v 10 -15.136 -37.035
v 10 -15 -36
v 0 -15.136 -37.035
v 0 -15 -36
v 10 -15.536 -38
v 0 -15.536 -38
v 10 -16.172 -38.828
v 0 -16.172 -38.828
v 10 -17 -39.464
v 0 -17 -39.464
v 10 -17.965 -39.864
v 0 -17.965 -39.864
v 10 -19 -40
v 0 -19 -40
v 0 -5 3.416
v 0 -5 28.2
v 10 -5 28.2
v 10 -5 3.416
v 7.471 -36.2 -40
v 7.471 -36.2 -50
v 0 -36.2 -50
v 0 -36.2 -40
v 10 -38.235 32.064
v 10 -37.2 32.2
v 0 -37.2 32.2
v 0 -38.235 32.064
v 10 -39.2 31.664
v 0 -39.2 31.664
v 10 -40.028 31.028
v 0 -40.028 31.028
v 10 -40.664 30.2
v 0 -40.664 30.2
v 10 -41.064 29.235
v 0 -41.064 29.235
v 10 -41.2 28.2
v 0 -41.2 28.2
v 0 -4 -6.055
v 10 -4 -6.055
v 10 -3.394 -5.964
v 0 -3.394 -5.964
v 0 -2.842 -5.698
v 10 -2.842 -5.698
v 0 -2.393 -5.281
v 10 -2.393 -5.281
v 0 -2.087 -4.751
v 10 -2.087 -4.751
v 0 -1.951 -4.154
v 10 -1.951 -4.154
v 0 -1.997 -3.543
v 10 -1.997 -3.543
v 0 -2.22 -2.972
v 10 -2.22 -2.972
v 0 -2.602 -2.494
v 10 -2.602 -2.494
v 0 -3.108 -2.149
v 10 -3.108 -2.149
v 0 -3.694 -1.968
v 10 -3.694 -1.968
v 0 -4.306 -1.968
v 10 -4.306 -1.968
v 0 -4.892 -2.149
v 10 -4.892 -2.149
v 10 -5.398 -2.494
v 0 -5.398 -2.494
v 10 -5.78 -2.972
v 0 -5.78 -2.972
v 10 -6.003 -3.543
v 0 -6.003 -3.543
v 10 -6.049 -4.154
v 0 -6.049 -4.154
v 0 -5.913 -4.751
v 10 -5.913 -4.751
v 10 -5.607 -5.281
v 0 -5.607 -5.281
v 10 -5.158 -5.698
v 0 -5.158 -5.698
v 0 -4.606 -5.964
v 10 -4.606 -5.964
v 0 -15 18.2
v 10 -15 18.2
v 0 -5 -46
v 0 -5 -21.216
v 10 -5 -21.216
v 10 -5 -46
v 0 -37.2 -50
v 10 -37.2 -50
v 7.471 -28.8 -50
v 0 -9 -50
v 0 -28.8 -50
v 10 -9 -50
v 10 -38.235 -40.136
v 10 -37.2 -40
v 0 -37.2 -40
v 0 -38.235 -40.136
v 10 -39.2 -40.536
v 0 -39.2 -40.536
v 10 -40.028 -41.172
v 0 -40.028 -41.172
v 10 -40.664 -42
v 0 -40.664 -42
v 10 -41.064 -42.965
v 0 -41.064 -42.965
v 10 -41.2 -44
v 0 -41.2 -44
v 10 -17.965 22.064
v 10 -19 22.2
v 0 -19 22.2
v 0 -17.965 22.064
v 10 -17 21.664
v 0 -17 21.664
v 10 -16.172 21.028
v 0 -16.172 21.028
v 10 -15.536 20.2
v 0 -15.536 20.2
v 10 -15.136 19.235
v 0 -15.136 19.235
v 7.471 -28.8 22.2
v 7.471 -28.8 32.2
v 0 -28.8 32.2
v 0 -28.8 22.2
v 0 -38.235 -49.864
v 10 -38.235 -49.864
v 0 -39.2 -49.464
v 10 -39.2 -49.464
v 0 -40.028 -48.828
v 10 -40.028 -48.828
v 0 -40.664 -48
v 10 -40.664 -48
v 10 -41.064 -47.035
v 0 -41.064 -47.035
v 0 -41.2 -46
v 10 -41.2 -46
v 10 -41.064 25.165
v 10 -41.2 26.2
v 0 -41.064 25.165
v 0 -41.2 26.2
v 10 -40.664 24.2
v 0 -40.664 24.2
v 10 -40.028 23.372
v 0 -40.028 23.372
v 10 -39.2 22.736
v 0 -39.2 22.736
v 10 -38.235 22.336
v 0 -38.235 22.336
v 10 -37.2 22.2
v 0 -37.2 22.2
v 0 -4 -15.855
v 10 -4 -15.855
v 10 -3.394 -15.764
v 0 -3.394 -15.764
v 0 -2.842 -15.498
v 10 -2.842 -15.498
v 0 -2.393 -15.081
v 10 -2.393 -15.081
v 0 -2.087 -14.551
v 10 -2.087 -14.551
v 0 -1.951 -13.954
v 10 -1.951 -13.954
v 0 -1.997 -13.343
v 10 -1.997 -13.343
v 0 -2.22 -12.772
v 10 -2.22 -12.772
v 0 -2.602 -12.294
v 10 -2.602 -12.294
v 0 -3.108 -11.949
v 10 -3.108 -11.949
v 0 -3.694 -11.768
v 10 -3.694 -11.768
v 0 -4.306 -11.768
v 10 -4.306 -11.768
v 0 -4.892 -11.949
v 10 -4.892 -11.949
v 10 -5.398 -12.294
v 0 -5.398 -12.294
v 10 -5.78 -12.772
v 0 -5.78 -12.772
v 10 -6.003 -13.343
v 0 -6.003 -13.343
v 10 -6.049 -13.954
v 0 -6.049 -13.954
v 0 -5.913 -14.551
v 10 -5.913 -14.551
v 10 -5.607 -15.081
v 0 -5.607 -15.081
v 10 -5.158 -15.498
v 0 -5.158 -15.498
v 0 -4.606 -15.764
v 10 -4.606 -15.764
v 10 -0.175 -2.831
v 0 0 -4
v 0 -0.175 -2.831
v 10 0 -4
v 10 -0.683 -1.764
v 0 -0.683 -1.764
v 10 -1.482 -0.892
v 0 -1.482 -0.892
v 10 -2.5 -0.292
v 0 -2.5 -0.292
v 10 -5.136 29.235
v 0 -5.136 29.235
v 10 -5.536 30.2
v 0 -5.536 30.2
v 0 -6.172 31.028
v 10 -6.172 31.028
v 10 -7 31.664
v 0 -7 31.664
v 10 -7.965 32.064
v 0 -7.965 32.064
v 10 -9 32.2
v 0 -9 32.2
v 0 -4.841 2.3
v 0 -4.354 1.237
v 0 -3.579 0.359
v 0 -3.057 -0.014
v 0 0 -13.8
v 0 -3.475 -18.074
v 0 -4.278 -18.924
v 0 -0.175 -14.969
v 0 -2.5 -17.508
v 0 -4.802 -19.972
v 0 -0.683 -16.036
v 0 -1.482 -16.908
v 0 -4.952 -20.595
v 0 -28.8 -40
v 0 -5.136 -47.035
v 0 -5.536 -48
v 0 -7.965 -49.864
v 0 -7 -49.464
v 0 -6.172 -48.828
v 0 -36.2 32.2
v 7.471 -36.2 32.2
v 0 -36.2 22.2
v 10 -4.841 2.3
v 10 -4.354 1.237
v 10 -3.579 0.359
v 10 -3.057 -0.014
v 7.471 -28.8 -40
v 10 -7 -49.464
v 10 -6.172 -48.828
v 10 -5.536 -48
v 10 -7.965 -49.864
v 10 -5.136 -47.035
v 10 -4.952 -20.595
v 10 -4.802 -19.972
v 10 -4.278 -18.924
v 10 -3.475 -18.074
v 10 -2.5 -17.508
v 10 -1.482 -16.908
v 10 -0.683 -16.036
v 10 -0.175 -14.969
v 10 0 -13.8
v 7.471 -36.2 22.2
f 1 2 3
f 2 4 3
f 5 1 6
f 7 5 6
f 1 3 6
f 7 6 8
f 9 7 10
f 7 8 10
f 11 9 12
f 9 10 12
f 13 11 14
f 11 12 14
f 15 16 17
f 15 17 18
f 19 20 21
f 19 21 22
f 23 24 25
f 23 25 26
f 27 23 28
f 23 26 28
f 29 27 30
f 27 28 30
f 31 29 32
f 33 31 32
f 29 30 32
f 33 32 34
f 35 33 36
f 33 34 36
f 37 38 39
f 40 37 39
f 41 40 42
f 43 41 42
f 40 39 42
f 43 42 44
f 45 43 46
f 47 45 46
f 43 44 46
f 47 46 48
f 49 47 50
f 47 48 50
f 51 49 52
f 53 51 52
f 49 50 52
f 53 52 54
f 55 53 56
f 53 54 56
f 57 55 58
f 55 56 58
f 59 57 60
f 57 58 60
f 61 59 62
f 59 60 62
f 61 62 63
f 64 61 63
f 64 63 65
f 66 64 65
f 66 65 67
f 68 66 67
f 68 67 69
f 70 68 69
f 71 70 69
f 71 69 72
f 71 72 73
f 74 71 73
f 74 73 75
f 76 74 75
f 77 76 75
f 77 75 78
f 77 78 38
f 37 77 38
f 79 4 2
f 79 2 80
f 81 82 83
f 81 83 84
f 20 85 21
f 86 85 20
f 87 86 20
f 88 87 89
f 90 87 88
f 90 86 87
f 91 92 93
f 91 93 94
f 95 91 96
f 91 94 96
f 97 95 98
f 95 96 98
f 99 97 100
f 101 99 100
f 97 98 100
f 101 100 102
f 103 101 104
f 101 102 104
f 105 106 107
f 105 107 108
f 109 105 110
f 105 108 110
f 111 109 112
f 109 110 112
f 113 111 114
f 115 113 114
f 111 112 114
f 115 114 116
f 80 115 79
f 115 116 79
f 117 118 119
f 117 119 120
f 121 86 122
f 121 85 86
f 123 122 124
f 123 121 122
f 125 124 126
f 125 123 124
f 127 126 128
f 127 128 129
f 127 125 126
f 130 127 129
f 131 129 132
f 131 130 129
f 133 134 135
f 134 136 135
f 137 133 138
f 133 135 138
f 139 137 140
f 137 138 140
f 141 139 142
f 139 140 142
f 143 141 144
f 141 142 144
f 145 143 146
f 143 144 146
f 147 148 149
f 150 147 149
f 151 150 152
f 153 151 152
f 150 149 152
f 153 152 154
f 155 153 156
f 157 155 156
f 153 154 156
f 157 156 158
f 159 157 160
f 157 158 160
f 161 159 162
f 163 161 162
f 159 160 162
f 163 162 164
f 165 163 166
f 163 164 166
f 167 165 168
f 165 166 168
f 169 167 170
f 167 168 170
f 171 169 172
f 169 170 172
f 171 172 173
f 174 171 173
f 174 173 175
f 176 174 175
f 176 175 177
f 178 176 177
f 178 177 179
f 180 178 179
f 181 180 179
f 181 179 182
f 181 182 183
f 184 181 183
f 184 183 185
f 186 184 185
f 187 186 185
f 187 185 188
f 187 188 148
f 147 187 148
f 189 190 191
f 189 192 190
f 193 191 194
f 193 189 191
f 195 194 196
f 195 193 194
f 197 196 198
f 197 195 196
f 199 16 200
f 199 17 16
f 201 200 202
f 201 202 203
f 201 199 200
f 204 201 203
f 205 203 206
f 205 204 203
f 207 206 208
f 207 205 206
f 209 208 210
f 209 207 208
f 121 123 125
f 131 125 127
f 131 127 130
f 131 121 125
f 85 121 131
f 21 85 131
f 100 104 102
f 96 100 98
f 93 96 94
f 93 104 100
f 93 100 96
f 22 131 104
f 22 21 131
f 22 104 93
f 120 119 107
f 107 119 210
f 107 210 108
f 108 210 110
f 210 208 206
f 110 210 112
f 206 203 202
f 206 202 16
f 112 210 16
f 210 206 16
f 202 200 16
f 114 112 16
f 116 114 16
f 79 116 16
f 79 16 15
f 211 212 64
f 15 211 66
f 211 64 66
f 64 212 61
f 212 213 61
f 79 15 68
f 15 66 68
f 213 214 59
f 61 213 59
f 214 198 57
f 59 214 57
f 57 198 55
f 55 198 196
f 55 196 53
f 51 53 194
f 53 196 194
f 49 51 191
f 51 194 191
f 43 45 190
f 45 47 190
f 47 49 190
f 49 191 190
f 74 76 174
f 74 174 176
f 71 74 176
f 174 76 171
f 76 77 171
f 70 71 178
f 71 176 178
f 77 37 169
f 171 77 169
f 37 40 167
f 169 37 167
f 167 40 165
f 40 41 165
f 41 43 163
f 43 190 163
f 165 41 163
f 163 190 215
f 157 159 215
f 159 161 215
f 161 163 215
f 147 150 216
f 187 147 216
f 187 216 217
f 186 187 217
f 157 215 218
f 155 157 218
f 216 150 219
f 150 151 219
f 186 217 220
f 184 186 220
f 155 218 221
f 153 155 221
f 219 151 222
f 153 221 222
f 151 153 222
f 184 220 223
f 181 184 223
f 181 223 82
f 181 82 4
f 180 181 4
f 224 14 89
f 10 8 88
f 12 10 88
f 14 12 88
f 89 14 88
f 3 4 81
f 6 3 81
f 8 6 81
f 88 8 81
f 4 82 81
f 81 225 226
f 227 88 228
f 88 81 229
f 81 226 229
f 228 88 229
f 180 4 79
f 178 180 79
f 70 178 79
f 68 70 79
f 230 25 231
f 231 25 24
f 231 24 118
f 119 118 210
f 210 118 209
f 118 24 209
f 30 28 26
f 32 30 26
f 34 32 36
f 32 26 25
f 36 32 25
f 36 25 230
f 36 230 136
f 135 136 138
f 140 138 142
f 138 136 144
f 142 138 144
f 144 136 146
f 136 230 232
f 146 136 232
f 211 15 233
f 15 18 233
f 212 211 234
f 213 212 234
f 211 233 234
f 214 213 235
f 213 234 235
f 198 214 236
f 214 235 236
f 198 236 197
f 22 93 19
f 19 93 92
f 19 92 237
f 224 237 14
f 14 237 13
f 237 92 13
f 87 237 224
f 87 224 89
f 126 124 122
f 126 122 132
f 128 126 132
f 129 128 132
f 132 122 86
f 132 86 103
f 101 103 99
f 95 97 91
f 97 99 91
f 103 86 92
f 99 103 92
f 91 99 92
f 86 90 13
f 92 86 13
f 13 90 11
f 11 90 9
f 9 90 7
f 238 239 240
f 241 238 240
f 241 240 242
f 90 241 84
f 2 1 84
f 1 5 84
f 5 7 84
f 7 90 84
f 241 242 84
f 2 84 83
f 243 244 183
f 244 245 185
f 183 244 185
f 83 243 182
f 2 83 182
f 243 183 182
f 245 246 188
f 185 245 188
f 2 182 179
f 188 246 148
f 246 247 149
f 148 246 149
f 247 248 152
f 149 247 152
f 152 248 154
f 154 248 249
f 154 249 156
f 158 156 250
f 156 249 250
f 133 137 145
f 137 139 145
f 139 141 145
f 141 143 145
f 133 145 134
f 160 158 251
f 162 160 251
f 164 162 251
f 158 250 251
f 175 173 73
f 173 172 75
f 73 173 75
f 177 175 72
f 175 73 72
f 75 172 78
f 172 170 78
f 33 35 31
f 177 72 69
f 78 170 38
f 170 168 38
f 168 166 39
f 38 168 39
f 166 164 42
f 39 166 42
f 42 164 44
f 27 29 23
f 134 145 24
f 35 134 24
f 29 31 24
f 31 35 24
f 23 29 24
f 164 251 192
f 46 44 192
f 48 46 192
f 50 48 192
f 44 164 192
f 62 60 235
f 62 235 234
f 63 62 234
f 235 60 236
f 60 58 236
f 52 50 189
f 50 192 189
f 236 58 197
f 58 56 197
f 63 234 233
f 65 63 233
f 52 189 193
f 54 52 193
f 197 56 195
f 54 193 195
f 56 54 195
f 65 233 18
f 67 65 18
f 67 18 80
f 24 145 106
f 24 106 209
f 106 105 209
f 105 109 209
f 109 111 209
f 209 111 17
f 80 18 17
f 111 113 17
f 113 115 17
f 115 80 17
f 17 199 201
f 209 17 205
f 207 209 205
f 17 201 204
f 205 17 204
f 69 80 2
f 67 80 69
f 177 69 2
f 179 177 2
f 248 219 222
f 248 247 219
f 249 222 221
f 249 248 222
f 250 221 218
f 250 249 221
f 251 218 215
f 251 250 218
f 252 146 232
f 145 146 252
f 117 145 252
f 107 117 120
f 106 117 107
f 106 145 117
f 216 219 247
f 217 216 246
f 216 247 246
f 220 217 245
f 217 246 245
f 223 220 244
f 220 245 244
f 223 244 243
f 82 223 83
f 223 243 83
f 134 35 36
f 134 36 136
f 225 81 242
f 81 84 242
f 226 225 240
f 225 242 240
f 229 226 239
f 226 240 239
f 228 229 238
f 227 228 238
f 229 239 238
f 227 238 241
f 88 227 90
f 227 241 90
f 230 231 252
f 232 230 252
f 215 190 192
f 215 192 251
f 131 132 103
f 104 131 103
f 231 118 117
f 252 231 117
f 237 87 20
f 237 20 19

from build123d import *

# Parameters (mm, degrees)
BOSS_EXTRUDE1_DEPTH = 10
SKETCH3_R           = 2.055
CUT_EXTRUDE1_DEPTH  = 11
SKETCH5_W           = 10
SKETCH5_H           = 13.8
BOSS_EXTRUDE2_DEPTH = 10
SKETCH10_W          = 10
SKETCH10_H          = 7.4
BOSS_EXTRUDE5_DEPTH = 2.52893219
SKETCH11_W          = 10
SKETCH11_H          = 5
BOSS_EXTRUDE6_DEPTH = 10
FILLET1_R           = 4
FILLET2_R           = 4
FILLET3_R           = 4


with BuildPart() as part:
    # Sketch1 → Boss-Extrude1 (new body)
    with BuildSketch(Plane(origin=(0, 0, 0), x_dir=(0, 0, -1), z_dir=(1, 0, 0))):
        Polygon((17.8, -5), (50, -5), (50, -15), (-32.2, -15), (-32.2, -5), (0, -5), (0, 0), (17.8, 0), align=None)
    extrude(amount=BOSS_EXTRUDE1_DEPTH)

    # Sketch3 → Cut-Extrude1 (cut, through all)
    with BuildSketch(Plane(origin=(10, 0, 0), x_dir=(0, 0, -1), z_dir=(1, 0, 0))):
        with Locations((4, -4)):
            Circle(SKETCH3_R)
        with Locations((13.8, -4)):
            Circle(SKETCH3_R)
    extrude(amount=-CUT_EXTRUDE1_DEPTH, mode=Mode.SUBTRACT)

    # Sketch5 → Boss-Extrude2 (add)
    with BuildSketch(Plane(origin=(10, 0, 0), x_dir=(0, 0, -1), z_dir=(1, 0, 0))):
        with Locations((-27.2, -21.9)):
            Rectangle(SKETCH5_W, SKETCH5_H)
        with Locations((45, -21.9)):
            Rectangle(SKETCH5_W, SKETCH5_H)
    extrude(amount=-BOSS_EXTRUDE2_DEPTH)

    # Sketch10 → Boss-Extrude5 (add)
    with BuildSketch(Plane(origin=(10, 0, 0), x_dir=(0, 0, -1), z_dir=(1, 0, 0))):
        with Locations((-27.2, -32.5)):
            Rectangle(SKETCH10_W, SKETCH10_H)
    boss_extrude5 = extrude(amount=-BOSS_EXTRUDE5_DEPTH)

    # Sketch11 → Boss-Extrude6 (add)
    with BuildSketch(Plane(origin=(10, 0, 0), x_dir=(0, 0, -1), z_dir=(1, 0, 0))):
        with Locations((-27.2, -38.7)):
            Rectangle(SKETCH11_W, SKETCH11_H)
    boss_extrude6 = extrude(amount=-BOSS_EXTRUDE6_DEPTH)

    # Mirror1: Boss-Extrude5, Boss-Extrude6 across plane
    add(boss_extrude5.mirror(Plane.XY.offset(-8.9)))
    add(boss_extrude6.mirror(Plane.XY.offset(-8.9)))

    # Fillet1
    fillet1_edges = [part.edges().sort_by_distance(p)[0] for p in [
        (5, 0, 0),
        (5, 0, -17.8),
    ]]
    fillet(fillet1_edges, radius=FILLET1_R)

    # Fillet2
    fillet2_edges = [part.edges().sort_by_distance(p)[0] for p in [
        (5, -41.2, -50),
        (5, -41.2, -40),
        (5, -5, -50),
        (5, -5, 32.2),
        (5, -15, 22.2),
        (5, -15, -40),
        (5, -41.2, 22.2),
        (5, -41.2, 32.2),
    ]]
    fillet(fillet2_edges, radius=FILLET2_R)

    # Fillet3
    fillet3_edges = [part.edges().sort_by_distance(p)[0] for p in [
        (5, -5, -17.8),
        (5, -5, 0),
    ]]
    fillet(fillet3_edges, radius=FILLET3_R)


solid = part.part
